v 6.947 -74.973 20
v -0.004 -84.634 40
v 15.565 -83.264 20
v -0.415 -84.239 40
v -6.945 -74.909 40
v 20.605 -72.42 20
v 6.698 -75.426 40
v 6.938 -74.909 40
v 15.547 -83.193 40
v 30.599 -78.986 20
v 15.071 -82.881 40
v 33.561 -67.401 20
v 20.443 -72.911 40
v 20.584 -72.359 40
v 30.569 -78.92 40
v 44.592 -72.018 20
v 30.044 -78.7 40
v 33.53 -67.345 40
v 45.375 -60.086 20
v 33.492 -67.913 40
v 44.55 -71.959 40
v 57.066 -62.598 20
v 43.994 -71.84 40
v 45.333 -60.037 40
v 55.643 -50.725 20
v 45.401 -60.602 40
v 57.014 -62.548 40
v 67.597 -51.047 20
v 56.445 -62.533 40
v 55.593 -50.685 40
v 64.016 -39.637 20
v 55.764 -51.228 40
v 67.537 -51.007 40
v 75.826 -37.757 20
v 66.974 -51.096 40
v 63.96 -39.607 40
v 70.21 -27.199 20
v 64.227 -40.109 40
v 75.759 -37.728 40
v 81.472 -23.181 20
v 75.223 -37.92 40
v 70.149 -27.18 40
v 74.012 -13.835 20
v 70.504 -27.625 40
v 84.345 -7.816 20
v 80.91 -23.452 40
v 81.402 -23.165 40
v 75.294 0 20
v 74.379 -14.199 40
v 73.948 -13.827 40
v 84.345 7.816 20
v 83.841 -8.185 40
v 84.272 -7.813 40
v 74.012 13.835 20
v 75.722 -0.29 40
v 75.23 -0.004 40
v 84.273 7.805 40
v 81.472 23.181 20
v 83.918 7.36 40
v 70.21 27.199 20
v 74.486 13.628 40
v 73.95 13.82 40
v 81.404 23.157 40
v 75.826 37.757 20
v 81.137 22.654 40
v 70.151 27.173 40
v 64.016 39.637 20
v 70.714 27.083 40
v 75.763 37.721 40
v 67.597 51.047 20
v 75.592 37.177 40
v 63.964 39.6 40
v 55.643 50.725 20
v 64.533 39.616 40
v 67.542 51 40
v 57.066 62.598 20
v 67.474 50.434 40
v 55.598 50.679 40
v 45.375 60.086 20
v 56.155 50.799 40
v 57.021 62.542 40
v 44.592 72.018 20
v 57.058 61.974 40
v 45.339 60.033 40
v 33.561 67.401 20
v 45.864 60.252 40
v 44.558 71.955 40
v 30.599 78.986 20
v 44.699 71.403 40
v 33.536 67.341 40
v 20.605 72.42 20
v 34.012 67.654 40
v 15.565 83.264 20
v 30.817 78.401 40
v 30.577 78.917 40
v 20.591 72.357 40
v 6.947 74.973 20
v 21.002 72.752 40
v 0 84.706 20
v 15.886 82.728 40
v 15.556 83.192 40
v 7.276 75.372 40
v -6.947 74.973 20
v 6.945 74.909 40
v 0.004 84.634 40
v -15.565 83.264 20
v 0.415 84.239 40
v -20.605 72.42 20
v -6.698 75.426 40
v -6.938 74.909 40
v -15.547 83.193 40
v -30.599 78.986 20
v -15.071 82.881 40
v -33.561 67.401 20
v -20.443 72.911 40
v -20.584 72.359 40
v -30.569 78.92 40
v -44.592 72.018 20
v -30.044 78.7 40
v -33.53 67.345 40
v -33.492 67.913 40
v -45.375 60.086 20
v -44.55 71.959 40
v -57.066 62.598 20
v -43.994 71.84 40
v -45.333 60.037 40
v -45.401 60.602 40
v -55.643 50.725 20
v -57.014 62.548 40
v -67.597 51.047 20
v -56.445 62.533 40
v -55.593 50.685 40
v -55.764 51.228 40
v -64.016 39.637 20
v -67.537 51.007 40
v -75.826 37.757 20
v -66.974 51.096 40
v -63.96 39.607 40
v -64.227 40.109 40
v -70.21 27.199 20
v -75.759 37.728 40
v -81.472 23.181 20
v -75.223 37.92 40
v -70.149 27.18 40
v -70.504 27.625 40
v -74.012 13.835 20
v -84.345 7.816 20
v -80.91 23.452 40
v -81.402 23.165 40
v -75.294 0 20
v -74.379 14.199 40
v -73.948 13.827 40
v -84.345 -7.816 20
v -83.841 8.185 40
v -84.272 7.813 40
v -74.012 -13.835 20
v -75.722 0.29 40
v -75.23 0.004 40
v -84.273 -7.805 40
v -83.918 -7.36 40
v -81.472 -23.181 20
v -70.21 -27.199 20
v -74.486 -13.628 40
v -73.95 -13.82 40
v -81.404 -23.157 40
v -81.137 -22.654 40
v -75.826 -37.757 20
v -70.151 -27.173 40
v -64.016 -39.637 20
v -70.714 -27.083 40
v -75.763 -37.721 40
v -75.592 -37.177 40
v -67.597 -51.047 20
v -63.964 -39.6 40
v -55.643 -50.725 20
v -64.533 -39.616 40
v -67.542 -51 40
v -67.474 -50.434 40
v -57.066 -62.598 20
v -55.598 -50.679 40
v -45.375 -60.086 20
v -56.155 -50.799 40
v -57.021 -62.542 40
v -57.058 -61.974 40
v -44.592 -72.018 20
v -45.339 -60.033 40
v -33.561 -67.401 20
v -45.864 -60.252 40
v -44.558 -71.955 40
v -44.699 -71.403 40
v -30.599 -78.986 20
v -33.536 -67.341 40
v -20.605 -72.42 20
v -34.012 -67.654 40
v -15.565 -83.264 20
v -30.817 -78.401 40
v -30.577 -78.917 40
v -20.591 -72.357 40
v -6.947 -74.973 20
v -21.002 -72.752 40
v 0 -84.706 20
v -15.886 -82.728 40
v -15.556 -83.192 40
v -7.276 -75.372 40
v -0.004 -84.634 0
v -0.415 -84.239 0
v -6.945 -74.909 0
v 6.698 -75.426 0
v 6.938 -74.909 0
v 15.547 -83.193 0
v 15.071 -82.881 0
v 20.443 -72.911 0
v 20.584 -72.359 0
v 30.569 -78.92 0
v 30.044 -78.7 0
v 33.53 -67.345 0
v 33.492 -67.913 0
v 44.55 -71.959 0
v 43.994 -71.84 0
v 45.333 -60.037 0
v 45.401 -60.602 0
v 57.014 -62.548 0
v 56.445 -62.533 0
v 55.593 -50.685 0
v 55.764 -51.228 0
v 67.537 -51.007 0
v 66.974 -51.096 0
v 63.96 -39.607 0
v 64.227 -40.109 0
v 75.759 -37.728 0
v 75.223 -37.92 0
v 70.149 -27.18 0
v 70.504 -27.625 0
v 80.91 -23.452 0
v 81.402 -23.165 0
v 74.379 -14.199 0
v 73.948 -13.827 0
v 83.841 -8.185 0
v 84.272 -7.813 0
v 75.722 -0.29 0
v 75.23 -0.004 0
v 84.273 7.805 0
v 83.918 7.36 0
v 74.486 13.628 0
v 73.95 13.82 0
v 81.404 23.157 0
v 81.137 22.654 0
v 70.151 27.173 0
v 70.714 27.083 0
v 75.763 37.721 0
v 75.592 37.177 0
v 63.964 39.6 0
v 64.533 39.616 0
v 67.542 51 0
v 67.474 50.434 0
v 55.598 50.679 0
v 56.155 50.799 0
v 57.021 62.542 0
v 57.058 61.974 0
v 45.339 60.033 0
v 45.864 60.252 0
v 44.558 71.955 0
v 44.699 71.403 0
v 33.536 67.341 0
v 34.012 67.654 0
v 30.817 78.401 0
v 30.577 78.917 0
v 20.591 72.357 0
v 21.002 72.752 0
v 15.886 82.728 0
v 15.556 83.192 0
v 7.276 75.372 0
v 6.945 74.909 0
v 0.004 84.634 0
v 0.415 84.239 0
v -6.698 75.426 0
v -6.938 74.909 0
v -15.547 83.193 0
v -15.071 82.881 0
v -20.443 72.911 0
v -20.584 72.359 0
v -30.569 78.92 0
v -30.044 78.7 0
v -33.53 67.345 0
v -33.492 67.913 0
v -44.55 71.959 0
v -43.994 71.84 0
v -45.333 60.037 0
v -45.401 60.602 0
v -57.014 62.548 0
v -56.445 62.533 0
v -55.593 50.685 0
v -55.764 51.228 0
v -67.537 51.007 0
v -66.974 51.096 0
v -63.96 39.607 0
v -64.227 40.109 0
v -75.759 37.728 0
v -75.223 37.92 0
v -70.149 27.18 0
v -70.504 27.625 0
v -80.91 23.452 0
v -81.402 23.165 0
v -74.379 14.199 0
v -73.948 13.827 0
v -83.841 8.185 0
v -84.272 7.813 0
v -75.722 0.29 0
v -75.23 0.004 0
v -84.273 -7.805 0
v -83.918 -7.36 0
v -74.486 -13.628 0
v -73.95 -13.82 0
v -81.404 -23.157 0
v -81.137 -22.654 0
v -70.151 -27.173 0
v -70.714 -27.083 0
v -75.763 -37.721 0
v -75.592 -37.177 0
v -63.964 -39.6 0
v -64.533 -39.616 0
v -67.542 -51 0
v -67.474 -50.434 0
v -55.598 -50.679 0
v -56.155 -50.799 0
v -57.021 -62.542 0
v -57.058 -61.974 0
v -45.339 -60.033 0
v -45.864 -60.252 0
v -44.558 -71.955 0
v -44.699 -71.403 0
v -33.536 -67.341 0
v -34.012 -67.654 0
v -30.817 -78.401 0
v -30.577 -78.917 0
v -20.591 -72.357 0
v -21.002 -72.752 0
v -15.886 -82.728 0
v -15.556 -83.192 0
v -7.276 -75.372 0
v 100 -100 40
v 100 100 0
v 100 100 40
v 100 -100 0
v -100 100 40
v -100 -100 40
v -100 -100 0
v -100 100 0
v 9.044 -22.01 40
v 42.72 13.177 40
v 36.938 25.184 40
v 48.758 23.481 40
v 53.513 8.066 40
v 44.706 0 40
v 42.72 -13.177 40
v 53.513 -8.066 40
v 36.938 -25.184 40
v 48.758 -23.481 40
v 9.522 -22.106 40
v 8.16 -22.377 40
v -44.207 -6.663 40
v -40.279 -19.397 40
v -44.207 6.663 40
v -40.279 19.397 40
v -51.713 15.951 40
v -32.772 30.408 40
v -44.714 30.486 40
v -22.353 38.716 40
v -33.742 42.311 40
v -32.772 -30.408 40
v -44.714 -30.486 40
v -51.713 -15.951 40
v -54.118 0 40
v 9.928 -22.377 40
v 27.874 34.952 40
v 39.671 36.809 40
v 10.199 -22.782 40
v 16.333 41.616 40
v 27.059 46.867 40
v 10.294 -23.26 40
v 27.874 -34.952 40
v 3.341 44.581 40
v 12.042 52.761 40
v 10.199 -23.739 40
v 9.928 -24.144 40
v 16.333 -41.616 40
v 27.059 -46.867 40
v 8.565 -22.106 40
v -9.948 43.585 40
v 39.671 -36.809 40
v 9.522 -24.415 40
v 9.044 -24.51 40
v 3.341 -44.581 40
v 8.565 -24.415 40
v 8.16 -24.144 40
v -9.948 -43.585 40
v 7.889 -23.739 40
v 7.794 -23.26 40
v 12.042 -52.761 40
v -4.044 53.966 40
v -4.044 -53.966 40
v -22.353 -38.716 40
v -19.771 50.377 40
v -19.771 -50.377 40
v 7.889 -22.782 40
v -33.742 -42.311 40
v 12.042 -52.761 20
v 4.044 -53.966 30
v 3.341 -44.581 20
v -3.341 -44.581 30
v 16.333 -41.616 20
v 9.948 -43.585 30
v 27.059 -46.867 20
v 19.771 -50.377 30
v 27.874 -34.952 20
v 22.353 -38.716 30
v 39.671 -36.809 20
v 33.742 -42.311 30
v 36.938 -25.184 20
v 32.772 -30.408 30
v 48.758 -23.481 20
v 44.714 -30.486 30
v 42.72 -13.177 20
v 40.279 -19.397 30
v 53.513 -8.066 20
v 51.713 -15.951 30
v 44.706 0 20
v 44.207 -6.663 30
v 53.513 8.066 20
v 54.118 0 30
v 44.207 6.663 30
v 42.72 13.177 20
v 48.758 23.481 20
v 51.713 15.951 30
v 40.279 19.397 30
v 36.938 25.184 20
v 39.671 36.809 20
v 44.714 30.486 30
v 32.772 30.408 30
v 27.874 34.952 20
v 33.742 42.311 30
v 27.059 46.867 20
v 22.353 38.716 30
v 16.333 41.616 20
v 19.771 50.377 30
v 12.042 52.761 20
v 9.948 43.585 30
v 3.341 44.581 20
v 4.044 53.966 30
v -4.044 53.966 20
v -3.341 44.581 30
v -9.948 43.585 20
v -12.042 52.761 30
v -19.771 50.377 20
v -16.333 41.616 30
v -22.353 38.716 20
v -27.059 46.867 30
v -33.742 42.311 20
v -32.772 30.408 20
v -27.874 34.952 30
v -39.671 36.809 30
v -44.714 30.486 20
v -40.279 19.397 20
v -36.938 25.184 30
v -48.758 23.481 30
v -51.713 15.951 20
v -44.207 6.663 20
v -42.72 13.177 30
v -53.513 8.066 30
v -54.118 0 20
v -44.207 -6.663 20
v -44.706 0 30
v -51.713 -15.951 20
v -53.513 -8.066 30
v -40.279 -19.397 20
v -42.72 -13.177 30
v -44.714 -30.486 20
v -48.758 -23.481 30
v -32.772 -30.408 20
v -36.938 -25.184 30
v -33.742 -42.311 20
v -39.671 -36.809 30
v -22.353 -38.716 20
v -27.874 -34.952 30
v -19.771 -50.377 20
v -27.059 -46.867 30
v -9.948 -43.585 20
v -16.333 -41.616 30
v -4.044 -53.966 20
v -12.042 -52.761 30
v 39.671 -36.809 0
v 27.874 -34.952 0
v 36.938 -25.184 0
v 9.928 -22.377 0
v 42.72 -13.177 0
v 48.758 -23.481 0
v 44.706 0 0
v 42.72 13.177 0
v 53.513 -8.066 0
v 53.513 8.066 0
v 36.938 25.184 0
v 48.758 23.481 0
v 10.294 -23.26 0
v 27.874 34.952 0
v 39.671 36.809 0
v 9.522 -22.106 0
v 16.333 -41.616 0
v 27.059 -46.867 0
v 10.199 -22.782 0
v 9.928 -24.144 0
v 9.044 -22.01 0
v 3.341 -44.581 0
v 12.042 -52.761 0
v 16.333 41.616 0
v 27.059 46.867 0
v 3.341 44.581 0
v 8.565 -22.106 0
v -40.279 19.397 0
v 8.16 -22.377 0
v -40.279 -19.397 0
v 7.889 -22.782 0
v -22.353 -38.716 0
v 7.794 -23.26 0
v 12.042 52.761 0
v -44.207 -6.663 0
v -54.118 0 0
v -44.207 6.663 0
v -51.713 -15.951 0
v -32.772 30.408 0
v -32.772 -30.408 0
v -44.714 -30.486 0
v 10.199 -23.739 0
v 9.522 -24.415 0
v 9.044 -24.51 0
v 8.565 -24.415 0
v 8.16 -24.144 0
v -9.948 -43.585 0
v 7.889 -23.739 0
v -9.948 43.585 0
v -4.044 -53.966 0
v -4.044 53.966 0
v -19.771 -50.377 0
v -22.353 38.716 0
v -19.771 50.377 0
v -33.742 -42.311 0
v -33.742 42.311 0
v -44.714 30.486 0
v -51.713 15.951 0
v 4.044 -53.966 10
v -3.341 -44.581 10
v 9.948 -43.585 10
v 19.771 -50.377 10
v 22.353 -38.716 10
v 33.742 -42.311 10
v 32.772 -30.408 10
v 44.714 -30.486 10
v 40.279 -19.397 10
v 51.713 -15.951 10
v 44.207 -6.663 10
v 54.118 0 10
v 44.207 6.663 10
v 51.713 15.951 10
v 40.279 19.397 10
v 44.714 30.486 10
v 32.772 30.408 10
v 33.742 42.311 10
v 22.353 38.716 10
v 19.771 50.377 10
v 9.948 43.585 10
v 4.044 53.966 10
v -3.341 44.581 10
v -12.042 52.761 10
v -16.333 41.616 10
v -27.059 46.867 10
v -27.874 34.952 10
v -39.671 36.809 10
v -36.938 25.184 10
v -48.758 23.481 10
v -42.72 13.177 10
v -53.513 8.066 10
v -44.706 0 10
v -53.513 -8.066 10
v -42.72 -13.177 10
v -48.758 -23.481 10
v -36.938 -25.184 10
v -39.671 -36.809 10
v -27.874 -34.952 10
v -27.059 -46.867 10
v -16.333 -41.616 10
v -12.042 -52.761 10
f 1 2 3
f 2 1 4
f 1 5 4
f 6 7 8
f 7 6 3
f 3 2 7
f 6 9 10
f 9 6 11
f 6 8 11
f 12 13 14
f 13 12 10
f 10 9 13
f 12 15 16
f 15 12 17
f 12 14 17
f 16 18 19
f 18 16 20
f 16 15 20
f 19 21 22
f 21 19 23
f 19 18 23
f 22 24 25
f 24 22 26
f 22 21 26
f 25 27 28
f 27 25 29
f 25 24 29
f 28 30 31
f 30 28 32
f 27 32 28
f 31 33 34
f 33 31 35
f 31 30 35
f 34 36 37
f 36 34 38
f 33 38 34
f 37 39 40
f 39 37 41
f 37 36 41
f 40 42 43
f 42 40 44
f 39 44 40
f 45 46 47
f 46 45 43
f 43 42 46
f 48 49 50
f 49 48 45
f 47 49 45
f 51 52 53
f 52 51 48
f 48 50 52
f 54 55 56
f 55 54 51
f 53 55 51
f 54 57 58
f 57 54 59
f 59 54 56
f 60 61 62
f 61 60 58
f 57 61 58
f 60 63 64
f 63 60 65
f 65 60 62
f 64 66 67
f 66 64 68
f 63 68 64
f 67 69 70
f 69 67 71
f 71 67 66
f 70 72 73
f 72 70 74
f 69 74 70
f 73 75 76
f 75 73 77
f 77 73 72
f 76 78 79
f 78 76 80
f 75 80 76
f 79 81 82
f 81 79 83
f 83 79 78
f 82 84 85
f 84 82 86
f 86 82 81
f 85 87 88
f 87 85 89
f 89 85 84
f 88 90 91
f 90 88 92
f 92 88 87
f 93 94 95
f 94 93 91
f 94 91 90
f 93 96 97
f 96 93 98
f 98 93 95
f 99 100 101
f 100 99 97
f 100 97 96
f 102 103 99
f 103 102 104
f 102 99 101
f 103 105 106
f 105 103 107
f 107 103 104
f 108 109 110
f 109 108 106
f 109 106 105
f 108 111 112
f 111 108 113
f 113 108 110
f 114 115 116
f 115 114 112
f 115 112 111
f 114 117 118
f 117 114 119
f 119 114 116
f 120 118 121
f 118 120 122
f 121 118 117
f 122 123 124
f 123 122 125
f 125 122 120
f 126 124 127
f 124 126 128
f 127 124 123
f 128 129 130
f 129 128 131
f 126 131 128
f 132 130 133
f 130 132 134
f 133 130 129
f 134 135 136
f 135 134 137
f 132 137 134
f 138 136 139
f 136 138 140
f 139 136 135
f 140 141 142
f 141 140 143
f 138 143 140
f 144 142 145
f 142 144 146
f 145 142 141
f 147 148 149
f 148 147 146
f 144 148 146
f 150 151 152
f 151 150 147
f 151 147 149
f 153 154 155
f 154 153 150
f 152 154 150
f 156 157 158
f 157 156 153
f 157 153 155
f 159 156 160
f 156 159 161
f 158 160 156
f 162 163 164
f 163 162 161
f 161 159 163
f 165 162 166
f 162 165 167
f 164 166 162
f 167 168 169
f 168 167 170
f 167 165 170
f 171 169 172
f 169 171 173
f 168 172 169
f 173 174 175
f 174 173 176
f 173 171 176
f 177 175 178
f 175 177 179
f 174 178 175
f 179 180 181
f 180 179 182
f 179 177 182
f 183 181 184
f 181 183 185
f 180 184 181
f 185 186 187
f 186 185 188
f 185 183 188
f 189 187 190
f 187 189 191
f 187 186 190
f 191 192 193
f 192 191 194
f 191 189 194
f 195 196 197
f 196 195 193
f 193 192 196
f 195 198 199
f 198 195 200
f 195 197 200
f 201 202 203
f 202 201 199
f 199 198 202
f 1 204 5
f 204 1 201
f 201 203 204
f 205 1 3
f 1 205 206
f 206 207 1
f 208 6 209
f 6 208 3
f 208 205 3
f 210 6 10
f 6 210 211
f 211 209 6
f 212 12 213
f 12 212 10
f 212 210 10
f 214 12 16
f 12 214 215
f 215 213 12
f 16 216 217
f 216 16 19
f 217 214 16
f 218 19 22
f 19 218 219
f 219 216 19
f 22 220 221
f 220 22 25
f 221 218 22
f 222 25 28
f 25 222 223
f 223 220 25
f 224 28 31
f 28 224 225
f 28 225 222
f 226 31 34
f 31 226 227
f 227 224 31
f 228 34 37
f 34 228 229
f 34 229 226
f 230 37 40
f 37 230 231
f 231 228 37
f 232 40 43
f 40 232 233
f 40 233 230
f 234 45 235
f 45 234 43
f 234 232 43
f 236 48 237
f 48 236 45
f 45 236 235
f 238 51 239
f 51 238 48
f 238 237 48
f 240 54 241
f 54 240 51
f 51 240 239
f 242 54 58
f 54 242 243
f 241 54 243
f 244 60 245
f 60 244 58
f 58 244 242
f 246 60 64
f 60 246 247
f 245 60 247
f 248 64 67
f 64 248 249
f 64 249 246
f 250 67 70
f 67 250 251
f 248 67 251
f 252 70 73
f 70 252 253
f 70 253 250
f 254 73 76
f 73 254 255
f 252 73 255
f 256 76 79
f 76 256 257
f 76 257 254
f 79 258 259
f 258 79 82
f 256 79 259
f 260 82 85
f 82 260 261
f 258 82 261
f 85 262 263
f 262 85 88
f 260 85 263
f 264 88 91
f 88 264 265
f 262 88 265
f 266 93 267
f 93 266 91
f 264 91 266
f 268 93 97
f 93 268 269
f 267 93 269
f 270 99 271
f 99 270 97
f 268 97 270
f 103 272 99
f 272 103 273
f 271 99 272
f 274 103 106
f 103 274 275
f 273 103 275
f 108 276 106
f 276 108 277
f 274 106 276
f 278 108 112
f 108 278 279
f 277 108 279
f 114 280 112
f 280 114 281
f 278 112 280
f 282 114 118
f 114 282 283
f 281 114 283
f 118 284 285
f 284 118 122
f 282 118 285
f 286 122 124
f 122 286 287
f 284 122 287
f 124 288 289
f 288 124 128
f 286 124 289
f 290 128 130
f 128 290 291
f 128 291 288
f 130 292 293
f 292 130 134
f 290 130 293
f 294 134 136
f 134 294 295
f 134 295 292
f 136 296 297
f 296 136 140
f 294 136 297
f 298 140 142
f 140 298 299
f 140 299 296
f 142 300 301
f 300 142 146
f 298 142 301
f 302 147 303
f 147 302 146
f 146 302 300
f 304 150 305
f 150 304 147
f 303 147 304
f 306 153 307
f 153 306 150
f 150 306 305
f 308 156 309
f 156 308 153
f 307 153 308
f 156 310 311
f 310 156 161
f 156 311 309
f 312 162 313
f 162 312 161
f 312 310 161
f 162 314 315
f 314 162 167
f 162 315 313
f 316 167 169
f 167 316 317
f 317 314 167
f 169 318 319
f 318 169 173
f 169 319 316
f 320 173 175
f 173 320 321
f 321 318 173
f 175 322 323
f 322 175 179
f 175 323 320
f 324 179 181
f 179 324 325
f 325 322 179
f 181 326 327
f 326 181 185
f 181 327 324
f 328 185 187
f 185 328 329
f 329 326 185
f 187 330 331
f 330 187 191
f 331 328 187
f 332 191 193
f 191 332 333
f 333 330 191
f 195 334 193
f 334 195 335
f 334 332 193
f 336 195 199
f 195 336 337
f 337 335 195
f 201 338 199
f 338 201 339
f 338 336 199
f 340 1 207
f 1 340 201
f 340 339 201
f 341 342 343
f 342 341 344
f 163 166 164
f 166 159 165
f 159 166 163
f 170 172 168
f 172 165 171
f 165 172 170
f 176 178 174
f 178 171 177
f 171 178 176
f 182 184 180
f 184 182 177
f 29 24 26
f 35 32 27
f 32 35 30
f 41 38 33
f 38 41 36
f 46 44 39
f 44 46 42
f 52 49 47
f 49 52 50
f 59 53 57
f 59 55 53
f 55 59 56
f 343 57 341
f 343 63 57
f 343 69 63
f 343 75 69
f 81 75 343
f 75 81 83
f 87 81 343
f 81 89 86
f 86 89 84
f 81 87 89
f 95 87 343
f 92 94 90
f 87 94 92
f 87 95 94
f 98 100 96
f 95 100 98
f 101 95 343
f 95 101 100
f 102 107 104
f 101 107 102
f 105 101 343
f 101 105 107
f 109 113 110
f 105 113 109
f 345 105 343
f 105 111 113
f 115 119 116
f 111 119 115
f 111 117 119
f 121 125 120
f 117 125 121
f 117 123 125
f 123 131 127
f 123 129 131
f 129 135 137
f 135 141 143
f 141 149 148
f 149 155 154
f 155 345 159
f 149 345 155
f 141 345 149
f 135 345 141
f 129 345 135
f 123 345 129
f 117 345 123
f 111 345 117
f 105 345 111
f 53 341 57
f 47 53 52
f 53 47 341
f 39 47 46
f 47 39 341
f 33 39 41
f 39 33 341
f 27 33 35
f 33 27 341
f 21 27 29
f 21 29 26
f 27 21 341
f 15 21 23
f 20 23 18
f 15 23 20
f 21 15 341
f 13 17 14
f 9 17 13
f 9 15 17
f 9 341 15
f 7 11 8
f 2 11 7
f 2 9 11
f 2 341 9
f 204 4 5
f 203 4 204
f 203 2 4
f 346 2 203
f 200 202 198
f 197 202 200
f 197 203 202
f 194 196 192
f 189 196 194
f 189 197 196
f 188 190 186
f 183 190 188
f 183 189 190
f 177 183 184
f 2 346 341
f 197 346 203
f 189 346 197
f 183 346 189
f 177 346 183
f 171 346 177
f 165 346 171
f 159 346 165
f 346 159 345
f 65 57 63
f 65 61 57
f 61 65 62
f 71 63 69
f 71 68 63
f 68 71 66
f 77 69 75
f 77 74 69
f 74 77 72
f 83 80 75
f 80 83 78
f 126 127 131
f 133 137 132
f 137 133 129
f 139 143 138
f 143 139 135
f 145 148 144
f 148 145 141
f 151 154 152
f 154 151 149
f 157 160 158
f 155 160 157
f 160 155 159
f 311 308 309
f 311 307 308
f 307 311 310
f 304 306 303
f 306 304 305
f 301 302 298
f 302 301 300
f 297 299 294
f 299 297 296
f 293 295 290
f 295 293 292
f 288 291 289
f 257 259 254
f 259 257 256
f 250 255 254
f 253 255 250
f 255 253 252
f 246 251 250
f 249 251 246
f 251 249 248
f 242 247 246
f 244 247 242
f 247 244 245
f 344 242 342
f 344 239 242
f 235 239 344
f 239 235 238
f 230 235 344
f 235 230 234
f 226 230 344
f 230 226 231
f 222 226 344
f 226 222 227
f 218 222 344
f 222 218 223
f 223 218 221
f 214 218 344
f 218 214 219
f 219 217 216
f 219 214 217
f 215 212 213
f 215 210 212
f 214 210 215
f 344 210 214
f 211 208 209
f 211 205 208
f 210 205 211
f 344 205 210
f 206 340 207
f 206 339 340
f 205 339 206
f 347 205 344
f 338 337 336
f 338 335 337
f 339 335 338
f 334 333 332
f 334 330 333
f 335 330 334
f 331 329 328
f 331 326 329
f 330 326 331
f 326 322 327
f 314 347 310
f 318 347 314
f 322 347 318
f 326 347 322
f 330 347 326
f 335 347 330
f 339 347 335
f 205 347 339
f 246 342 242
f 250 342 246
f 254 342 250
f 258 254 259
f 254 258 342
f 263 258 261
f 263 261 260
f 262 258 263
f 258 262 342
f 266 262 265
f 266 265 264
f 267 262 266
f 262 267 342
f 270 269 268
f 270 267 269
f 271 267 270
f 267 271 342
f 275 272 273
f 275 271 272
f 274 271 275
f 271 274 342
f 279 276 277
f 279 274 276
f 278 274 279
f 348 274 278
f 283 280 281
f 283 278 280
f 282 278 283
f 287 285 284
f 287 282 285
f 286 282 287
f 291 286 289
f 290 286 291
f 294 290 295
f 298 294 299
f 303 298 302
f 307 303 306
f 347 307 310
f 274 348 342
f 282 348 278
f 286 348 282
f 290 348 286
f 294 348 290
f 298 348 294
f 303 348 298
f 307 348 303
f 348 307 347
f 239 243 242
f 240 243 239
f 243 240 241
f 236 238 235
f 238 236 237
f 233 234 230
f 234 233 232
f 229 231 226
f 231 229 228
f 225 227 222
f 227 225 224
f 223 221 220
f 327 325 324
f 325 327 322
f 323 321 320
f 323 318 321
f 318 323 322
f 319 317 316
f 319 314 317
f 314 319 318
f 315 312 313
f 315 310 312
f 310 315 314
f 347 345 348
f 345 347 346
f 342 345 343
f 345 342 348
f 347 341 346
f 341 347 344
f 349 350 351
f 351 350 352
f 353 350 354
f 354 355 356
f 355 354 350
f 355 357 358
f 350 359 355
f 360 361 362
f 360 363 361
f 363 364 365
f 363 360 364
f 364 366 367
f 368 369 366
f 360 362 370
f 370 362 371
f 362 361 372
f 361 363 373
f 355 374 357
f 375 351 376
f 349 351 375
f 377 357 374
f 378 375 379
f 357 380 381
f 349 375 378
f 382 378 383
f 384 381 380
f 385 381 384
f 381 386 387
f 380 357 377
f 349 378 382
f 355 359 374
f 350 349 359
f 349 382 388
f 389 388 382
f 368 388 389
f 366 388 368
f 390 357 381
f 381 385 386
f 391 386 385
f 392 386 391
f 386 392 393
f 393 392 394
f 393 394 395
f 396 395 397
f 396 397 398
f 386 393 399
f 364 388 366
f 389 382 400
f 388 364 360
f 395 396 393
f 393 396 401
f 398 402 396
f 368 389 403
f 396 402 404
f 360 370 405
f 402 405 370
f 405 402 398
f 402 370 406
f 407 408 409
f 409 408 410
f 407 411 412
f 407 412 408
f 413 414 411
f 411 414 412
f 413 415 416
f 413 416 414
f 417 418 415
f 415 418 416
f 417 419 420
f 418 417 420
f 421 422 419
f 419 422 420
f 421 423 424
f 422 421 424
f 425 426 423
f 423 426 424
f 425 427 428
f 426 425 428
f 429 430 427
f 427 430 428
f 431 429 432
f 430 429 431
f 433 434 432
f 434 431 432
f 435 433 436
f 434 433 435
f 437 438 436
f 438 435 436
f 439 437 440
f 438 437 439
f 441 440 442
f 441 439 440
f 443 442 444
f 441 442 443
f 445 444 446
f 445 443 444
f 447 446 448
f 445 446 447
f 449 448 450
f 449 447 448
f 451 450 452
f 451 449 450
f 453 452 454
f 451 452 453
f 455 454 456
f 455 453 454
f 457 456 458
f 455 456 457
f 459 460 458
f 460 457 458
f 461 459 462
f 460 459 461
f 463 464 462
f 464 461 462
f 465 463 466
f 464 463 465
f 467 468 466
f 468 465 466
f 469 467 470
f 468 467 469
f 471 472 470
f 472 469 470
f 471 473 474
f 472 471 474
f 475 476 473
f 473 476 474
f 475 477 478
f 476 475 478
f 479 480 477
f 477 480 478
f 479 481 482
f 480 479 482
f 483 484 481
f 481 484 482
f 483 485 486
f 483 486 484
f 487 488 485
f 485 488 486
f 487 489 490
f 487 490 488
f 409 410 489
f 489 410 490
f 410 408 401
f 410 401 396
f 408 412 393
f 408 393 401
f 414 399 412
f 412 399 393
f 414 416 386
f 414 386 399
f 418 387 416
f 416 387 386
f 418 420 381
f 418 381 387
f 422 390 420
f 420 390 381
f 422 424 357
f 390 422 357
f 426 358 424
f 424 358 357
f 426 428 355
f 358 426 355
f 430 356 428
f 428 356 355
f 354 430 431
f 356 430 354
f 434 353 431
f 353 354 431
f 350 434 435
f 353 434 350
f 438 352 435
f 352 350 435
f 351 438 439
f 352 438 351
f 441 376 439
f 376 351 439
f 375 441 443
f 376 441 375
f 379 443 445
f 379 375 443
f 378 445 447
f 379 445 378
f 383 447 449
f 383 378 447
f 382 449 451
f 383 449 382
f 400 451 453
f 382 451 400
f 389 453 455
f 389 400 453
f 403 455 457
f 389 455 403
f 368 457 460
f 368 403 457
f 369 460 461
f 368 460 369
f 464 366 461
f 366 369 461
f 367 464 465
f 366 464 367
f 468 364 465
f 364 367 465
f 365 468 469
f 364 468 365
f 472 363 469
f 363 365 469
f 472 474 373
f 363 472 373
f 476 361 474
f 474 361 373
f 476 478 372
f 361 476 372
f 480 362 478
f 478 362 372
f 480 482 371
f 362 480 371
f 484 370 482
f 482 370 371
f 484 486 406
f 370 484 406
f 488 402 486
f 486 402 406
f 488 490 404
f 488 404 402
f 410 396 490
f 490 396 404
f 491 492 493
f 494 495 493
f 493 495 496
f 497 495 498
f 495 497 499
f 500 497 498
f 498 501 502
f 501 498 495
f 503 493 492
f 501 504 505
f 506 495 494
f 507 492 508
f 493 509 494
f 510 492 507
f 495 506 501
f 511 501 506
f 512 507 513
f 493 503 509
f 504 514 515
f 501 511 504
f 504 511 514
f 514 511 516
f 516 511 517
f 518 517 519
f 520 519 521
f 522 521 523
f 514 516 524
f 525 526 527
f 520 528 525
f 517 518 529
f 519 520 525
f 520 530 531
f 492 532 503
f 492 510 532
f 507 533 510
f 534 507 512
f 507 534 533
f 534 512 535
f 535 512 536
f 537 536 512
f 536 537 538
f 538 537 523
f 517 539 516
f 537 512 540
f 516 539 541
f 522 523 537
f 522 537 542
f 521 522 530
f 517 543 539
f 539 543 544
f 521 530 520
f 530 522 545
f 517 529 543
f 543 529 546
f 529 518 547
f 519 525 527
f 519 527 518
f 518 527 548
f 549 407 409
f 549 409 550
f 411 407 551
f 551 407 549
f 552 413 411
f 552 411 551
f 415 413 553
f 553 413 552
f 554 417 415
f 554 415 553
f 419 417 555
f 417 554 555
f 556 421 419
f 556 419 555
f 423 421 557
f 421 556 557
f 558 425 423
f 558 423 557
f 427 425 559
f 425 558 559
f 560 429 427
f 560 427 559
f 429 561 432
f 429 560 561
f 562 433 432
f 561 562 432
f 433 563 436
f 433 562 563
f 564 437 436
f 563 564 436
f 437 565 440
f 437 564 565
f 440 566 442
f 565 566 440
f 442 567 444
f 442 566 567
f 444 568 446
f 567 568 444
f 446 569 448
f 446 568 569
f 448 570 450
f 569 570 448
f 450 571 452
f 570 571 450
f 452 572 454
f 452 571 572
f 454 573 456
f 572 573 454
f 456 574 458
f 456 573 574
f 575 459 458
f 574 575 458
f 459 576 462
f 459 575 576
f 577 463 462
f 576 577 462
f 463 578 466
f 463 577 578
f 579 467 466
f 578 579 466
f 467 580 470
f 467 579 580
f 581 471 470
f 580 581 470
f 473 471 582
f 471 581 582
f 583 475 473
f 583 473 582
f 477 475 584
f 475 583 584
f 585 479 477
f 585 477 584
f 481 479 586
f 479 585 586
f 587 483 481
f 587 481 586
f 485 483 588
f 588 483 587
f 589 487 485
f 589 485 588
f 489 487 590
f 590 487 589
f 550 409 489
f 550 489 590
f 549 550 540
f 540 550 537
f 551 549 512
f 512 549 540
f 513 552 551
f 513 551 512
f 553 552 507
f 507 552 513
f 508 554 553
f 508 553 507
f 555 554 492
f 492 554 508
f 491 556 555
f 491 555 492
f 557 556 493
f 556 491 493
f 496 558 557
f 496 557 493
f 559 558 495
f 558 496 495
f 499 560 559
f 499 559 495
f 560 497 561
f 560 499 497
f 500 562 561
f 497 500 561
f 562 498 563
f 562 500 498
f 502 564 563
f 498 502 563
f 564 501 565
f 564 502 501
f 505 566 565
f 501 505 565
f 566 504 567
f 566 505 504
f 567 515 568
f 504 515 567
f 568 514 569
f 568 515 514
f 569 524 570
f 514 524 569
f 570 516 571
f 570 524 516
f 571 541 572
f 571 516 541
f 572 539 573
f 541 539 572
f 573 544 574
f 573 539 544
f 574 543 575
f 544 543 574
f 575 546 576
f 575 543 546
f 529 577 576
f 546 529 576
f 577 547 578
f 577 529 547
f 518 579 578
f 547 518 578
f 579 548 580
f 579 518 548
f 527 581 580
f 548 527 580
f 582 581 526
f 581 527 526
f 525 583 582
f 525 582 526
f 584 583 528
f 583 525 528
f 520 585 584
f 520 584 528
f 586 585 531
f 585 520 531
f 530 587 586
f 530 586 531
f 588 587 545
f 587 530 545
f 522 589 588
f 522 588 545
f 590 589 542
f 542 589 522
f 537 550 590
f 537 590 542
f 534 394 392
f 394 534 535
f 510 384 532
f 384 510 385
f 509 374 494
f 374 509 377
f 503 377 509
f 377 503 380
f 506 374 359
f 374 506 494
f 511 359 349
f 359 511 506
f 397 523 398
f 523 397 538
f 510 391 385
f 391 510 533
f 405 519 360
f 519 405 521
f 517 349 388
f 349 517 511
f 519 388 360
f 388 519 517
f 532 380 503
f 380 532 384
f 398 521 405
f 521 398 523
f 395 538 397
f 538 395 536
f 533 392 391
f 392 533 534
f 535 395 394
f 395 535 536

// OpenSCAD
draft = true;
phi = (sqrt(5)-1)/2;
count1 = draft ? 21 : 144;
count2 = draft ? 34 : 233;
r = 80;
dr = r/count2;
dh = dr*4;
h=40;
width=200;

n=1; //610;
module spike_gear(count, height, dr, dh, twist) {
    r = count * dr;
    function polar(i, r) = [cos(i * 180 / count), sin(i * 180 / count)] * r;
    points = [for (i = [1:count * 2]) ((i % 2) ? polar(i, r + dh / 2) : polar(i, r - dh / 2))];
    translate([0,0,height/2]) {
        linear_extrude(height = height/2, twist = twist) polygon(points);
        mirror([0,0,1]) linear_extrude(height = height/2, twist = twist) polygon(points);
    }
}


words = ["The", "Worst", "Spirograph", "Ever"];


difference(){
    translate([-100,-100,0]) cube([200,200,h]);
    translate([0,0,-1]) spike_gear(count2, h+2, dr, dh,360*(h+2)/h/count2);
    if (!draft) for(i=[0:4]){
        rotate([0,0,45-i*90])
        translate([0,count2*dr*1.095,h-1])
        linear_extrude(height = 2) {
            text(words[i], size = 10, halign = "center", valign = "center", $fn = 16);
        }
    }

    translate([-count2*dr*1.04,count2*dr*1.04,1])
    rotate([0,180,90])
    if (!draft) linear_extrude(height = 2) {
        text("pvillano", size = 10, halign = "left", valign = "top", $fn = 16);
    }
}
difference(){
    spike_gear(count1, h, dr, dh, 360/count1);
    for(i=[.5:n]){
        c=count1*dr-1.5*dh;
        translate([sqrt(i/n)*c*cos(360*i/phi), sqrt(i/n)*c*sin(360*i/phi), -1])
            cylinder(d=2.5,h=h+2, $fn=16);
    }
}
